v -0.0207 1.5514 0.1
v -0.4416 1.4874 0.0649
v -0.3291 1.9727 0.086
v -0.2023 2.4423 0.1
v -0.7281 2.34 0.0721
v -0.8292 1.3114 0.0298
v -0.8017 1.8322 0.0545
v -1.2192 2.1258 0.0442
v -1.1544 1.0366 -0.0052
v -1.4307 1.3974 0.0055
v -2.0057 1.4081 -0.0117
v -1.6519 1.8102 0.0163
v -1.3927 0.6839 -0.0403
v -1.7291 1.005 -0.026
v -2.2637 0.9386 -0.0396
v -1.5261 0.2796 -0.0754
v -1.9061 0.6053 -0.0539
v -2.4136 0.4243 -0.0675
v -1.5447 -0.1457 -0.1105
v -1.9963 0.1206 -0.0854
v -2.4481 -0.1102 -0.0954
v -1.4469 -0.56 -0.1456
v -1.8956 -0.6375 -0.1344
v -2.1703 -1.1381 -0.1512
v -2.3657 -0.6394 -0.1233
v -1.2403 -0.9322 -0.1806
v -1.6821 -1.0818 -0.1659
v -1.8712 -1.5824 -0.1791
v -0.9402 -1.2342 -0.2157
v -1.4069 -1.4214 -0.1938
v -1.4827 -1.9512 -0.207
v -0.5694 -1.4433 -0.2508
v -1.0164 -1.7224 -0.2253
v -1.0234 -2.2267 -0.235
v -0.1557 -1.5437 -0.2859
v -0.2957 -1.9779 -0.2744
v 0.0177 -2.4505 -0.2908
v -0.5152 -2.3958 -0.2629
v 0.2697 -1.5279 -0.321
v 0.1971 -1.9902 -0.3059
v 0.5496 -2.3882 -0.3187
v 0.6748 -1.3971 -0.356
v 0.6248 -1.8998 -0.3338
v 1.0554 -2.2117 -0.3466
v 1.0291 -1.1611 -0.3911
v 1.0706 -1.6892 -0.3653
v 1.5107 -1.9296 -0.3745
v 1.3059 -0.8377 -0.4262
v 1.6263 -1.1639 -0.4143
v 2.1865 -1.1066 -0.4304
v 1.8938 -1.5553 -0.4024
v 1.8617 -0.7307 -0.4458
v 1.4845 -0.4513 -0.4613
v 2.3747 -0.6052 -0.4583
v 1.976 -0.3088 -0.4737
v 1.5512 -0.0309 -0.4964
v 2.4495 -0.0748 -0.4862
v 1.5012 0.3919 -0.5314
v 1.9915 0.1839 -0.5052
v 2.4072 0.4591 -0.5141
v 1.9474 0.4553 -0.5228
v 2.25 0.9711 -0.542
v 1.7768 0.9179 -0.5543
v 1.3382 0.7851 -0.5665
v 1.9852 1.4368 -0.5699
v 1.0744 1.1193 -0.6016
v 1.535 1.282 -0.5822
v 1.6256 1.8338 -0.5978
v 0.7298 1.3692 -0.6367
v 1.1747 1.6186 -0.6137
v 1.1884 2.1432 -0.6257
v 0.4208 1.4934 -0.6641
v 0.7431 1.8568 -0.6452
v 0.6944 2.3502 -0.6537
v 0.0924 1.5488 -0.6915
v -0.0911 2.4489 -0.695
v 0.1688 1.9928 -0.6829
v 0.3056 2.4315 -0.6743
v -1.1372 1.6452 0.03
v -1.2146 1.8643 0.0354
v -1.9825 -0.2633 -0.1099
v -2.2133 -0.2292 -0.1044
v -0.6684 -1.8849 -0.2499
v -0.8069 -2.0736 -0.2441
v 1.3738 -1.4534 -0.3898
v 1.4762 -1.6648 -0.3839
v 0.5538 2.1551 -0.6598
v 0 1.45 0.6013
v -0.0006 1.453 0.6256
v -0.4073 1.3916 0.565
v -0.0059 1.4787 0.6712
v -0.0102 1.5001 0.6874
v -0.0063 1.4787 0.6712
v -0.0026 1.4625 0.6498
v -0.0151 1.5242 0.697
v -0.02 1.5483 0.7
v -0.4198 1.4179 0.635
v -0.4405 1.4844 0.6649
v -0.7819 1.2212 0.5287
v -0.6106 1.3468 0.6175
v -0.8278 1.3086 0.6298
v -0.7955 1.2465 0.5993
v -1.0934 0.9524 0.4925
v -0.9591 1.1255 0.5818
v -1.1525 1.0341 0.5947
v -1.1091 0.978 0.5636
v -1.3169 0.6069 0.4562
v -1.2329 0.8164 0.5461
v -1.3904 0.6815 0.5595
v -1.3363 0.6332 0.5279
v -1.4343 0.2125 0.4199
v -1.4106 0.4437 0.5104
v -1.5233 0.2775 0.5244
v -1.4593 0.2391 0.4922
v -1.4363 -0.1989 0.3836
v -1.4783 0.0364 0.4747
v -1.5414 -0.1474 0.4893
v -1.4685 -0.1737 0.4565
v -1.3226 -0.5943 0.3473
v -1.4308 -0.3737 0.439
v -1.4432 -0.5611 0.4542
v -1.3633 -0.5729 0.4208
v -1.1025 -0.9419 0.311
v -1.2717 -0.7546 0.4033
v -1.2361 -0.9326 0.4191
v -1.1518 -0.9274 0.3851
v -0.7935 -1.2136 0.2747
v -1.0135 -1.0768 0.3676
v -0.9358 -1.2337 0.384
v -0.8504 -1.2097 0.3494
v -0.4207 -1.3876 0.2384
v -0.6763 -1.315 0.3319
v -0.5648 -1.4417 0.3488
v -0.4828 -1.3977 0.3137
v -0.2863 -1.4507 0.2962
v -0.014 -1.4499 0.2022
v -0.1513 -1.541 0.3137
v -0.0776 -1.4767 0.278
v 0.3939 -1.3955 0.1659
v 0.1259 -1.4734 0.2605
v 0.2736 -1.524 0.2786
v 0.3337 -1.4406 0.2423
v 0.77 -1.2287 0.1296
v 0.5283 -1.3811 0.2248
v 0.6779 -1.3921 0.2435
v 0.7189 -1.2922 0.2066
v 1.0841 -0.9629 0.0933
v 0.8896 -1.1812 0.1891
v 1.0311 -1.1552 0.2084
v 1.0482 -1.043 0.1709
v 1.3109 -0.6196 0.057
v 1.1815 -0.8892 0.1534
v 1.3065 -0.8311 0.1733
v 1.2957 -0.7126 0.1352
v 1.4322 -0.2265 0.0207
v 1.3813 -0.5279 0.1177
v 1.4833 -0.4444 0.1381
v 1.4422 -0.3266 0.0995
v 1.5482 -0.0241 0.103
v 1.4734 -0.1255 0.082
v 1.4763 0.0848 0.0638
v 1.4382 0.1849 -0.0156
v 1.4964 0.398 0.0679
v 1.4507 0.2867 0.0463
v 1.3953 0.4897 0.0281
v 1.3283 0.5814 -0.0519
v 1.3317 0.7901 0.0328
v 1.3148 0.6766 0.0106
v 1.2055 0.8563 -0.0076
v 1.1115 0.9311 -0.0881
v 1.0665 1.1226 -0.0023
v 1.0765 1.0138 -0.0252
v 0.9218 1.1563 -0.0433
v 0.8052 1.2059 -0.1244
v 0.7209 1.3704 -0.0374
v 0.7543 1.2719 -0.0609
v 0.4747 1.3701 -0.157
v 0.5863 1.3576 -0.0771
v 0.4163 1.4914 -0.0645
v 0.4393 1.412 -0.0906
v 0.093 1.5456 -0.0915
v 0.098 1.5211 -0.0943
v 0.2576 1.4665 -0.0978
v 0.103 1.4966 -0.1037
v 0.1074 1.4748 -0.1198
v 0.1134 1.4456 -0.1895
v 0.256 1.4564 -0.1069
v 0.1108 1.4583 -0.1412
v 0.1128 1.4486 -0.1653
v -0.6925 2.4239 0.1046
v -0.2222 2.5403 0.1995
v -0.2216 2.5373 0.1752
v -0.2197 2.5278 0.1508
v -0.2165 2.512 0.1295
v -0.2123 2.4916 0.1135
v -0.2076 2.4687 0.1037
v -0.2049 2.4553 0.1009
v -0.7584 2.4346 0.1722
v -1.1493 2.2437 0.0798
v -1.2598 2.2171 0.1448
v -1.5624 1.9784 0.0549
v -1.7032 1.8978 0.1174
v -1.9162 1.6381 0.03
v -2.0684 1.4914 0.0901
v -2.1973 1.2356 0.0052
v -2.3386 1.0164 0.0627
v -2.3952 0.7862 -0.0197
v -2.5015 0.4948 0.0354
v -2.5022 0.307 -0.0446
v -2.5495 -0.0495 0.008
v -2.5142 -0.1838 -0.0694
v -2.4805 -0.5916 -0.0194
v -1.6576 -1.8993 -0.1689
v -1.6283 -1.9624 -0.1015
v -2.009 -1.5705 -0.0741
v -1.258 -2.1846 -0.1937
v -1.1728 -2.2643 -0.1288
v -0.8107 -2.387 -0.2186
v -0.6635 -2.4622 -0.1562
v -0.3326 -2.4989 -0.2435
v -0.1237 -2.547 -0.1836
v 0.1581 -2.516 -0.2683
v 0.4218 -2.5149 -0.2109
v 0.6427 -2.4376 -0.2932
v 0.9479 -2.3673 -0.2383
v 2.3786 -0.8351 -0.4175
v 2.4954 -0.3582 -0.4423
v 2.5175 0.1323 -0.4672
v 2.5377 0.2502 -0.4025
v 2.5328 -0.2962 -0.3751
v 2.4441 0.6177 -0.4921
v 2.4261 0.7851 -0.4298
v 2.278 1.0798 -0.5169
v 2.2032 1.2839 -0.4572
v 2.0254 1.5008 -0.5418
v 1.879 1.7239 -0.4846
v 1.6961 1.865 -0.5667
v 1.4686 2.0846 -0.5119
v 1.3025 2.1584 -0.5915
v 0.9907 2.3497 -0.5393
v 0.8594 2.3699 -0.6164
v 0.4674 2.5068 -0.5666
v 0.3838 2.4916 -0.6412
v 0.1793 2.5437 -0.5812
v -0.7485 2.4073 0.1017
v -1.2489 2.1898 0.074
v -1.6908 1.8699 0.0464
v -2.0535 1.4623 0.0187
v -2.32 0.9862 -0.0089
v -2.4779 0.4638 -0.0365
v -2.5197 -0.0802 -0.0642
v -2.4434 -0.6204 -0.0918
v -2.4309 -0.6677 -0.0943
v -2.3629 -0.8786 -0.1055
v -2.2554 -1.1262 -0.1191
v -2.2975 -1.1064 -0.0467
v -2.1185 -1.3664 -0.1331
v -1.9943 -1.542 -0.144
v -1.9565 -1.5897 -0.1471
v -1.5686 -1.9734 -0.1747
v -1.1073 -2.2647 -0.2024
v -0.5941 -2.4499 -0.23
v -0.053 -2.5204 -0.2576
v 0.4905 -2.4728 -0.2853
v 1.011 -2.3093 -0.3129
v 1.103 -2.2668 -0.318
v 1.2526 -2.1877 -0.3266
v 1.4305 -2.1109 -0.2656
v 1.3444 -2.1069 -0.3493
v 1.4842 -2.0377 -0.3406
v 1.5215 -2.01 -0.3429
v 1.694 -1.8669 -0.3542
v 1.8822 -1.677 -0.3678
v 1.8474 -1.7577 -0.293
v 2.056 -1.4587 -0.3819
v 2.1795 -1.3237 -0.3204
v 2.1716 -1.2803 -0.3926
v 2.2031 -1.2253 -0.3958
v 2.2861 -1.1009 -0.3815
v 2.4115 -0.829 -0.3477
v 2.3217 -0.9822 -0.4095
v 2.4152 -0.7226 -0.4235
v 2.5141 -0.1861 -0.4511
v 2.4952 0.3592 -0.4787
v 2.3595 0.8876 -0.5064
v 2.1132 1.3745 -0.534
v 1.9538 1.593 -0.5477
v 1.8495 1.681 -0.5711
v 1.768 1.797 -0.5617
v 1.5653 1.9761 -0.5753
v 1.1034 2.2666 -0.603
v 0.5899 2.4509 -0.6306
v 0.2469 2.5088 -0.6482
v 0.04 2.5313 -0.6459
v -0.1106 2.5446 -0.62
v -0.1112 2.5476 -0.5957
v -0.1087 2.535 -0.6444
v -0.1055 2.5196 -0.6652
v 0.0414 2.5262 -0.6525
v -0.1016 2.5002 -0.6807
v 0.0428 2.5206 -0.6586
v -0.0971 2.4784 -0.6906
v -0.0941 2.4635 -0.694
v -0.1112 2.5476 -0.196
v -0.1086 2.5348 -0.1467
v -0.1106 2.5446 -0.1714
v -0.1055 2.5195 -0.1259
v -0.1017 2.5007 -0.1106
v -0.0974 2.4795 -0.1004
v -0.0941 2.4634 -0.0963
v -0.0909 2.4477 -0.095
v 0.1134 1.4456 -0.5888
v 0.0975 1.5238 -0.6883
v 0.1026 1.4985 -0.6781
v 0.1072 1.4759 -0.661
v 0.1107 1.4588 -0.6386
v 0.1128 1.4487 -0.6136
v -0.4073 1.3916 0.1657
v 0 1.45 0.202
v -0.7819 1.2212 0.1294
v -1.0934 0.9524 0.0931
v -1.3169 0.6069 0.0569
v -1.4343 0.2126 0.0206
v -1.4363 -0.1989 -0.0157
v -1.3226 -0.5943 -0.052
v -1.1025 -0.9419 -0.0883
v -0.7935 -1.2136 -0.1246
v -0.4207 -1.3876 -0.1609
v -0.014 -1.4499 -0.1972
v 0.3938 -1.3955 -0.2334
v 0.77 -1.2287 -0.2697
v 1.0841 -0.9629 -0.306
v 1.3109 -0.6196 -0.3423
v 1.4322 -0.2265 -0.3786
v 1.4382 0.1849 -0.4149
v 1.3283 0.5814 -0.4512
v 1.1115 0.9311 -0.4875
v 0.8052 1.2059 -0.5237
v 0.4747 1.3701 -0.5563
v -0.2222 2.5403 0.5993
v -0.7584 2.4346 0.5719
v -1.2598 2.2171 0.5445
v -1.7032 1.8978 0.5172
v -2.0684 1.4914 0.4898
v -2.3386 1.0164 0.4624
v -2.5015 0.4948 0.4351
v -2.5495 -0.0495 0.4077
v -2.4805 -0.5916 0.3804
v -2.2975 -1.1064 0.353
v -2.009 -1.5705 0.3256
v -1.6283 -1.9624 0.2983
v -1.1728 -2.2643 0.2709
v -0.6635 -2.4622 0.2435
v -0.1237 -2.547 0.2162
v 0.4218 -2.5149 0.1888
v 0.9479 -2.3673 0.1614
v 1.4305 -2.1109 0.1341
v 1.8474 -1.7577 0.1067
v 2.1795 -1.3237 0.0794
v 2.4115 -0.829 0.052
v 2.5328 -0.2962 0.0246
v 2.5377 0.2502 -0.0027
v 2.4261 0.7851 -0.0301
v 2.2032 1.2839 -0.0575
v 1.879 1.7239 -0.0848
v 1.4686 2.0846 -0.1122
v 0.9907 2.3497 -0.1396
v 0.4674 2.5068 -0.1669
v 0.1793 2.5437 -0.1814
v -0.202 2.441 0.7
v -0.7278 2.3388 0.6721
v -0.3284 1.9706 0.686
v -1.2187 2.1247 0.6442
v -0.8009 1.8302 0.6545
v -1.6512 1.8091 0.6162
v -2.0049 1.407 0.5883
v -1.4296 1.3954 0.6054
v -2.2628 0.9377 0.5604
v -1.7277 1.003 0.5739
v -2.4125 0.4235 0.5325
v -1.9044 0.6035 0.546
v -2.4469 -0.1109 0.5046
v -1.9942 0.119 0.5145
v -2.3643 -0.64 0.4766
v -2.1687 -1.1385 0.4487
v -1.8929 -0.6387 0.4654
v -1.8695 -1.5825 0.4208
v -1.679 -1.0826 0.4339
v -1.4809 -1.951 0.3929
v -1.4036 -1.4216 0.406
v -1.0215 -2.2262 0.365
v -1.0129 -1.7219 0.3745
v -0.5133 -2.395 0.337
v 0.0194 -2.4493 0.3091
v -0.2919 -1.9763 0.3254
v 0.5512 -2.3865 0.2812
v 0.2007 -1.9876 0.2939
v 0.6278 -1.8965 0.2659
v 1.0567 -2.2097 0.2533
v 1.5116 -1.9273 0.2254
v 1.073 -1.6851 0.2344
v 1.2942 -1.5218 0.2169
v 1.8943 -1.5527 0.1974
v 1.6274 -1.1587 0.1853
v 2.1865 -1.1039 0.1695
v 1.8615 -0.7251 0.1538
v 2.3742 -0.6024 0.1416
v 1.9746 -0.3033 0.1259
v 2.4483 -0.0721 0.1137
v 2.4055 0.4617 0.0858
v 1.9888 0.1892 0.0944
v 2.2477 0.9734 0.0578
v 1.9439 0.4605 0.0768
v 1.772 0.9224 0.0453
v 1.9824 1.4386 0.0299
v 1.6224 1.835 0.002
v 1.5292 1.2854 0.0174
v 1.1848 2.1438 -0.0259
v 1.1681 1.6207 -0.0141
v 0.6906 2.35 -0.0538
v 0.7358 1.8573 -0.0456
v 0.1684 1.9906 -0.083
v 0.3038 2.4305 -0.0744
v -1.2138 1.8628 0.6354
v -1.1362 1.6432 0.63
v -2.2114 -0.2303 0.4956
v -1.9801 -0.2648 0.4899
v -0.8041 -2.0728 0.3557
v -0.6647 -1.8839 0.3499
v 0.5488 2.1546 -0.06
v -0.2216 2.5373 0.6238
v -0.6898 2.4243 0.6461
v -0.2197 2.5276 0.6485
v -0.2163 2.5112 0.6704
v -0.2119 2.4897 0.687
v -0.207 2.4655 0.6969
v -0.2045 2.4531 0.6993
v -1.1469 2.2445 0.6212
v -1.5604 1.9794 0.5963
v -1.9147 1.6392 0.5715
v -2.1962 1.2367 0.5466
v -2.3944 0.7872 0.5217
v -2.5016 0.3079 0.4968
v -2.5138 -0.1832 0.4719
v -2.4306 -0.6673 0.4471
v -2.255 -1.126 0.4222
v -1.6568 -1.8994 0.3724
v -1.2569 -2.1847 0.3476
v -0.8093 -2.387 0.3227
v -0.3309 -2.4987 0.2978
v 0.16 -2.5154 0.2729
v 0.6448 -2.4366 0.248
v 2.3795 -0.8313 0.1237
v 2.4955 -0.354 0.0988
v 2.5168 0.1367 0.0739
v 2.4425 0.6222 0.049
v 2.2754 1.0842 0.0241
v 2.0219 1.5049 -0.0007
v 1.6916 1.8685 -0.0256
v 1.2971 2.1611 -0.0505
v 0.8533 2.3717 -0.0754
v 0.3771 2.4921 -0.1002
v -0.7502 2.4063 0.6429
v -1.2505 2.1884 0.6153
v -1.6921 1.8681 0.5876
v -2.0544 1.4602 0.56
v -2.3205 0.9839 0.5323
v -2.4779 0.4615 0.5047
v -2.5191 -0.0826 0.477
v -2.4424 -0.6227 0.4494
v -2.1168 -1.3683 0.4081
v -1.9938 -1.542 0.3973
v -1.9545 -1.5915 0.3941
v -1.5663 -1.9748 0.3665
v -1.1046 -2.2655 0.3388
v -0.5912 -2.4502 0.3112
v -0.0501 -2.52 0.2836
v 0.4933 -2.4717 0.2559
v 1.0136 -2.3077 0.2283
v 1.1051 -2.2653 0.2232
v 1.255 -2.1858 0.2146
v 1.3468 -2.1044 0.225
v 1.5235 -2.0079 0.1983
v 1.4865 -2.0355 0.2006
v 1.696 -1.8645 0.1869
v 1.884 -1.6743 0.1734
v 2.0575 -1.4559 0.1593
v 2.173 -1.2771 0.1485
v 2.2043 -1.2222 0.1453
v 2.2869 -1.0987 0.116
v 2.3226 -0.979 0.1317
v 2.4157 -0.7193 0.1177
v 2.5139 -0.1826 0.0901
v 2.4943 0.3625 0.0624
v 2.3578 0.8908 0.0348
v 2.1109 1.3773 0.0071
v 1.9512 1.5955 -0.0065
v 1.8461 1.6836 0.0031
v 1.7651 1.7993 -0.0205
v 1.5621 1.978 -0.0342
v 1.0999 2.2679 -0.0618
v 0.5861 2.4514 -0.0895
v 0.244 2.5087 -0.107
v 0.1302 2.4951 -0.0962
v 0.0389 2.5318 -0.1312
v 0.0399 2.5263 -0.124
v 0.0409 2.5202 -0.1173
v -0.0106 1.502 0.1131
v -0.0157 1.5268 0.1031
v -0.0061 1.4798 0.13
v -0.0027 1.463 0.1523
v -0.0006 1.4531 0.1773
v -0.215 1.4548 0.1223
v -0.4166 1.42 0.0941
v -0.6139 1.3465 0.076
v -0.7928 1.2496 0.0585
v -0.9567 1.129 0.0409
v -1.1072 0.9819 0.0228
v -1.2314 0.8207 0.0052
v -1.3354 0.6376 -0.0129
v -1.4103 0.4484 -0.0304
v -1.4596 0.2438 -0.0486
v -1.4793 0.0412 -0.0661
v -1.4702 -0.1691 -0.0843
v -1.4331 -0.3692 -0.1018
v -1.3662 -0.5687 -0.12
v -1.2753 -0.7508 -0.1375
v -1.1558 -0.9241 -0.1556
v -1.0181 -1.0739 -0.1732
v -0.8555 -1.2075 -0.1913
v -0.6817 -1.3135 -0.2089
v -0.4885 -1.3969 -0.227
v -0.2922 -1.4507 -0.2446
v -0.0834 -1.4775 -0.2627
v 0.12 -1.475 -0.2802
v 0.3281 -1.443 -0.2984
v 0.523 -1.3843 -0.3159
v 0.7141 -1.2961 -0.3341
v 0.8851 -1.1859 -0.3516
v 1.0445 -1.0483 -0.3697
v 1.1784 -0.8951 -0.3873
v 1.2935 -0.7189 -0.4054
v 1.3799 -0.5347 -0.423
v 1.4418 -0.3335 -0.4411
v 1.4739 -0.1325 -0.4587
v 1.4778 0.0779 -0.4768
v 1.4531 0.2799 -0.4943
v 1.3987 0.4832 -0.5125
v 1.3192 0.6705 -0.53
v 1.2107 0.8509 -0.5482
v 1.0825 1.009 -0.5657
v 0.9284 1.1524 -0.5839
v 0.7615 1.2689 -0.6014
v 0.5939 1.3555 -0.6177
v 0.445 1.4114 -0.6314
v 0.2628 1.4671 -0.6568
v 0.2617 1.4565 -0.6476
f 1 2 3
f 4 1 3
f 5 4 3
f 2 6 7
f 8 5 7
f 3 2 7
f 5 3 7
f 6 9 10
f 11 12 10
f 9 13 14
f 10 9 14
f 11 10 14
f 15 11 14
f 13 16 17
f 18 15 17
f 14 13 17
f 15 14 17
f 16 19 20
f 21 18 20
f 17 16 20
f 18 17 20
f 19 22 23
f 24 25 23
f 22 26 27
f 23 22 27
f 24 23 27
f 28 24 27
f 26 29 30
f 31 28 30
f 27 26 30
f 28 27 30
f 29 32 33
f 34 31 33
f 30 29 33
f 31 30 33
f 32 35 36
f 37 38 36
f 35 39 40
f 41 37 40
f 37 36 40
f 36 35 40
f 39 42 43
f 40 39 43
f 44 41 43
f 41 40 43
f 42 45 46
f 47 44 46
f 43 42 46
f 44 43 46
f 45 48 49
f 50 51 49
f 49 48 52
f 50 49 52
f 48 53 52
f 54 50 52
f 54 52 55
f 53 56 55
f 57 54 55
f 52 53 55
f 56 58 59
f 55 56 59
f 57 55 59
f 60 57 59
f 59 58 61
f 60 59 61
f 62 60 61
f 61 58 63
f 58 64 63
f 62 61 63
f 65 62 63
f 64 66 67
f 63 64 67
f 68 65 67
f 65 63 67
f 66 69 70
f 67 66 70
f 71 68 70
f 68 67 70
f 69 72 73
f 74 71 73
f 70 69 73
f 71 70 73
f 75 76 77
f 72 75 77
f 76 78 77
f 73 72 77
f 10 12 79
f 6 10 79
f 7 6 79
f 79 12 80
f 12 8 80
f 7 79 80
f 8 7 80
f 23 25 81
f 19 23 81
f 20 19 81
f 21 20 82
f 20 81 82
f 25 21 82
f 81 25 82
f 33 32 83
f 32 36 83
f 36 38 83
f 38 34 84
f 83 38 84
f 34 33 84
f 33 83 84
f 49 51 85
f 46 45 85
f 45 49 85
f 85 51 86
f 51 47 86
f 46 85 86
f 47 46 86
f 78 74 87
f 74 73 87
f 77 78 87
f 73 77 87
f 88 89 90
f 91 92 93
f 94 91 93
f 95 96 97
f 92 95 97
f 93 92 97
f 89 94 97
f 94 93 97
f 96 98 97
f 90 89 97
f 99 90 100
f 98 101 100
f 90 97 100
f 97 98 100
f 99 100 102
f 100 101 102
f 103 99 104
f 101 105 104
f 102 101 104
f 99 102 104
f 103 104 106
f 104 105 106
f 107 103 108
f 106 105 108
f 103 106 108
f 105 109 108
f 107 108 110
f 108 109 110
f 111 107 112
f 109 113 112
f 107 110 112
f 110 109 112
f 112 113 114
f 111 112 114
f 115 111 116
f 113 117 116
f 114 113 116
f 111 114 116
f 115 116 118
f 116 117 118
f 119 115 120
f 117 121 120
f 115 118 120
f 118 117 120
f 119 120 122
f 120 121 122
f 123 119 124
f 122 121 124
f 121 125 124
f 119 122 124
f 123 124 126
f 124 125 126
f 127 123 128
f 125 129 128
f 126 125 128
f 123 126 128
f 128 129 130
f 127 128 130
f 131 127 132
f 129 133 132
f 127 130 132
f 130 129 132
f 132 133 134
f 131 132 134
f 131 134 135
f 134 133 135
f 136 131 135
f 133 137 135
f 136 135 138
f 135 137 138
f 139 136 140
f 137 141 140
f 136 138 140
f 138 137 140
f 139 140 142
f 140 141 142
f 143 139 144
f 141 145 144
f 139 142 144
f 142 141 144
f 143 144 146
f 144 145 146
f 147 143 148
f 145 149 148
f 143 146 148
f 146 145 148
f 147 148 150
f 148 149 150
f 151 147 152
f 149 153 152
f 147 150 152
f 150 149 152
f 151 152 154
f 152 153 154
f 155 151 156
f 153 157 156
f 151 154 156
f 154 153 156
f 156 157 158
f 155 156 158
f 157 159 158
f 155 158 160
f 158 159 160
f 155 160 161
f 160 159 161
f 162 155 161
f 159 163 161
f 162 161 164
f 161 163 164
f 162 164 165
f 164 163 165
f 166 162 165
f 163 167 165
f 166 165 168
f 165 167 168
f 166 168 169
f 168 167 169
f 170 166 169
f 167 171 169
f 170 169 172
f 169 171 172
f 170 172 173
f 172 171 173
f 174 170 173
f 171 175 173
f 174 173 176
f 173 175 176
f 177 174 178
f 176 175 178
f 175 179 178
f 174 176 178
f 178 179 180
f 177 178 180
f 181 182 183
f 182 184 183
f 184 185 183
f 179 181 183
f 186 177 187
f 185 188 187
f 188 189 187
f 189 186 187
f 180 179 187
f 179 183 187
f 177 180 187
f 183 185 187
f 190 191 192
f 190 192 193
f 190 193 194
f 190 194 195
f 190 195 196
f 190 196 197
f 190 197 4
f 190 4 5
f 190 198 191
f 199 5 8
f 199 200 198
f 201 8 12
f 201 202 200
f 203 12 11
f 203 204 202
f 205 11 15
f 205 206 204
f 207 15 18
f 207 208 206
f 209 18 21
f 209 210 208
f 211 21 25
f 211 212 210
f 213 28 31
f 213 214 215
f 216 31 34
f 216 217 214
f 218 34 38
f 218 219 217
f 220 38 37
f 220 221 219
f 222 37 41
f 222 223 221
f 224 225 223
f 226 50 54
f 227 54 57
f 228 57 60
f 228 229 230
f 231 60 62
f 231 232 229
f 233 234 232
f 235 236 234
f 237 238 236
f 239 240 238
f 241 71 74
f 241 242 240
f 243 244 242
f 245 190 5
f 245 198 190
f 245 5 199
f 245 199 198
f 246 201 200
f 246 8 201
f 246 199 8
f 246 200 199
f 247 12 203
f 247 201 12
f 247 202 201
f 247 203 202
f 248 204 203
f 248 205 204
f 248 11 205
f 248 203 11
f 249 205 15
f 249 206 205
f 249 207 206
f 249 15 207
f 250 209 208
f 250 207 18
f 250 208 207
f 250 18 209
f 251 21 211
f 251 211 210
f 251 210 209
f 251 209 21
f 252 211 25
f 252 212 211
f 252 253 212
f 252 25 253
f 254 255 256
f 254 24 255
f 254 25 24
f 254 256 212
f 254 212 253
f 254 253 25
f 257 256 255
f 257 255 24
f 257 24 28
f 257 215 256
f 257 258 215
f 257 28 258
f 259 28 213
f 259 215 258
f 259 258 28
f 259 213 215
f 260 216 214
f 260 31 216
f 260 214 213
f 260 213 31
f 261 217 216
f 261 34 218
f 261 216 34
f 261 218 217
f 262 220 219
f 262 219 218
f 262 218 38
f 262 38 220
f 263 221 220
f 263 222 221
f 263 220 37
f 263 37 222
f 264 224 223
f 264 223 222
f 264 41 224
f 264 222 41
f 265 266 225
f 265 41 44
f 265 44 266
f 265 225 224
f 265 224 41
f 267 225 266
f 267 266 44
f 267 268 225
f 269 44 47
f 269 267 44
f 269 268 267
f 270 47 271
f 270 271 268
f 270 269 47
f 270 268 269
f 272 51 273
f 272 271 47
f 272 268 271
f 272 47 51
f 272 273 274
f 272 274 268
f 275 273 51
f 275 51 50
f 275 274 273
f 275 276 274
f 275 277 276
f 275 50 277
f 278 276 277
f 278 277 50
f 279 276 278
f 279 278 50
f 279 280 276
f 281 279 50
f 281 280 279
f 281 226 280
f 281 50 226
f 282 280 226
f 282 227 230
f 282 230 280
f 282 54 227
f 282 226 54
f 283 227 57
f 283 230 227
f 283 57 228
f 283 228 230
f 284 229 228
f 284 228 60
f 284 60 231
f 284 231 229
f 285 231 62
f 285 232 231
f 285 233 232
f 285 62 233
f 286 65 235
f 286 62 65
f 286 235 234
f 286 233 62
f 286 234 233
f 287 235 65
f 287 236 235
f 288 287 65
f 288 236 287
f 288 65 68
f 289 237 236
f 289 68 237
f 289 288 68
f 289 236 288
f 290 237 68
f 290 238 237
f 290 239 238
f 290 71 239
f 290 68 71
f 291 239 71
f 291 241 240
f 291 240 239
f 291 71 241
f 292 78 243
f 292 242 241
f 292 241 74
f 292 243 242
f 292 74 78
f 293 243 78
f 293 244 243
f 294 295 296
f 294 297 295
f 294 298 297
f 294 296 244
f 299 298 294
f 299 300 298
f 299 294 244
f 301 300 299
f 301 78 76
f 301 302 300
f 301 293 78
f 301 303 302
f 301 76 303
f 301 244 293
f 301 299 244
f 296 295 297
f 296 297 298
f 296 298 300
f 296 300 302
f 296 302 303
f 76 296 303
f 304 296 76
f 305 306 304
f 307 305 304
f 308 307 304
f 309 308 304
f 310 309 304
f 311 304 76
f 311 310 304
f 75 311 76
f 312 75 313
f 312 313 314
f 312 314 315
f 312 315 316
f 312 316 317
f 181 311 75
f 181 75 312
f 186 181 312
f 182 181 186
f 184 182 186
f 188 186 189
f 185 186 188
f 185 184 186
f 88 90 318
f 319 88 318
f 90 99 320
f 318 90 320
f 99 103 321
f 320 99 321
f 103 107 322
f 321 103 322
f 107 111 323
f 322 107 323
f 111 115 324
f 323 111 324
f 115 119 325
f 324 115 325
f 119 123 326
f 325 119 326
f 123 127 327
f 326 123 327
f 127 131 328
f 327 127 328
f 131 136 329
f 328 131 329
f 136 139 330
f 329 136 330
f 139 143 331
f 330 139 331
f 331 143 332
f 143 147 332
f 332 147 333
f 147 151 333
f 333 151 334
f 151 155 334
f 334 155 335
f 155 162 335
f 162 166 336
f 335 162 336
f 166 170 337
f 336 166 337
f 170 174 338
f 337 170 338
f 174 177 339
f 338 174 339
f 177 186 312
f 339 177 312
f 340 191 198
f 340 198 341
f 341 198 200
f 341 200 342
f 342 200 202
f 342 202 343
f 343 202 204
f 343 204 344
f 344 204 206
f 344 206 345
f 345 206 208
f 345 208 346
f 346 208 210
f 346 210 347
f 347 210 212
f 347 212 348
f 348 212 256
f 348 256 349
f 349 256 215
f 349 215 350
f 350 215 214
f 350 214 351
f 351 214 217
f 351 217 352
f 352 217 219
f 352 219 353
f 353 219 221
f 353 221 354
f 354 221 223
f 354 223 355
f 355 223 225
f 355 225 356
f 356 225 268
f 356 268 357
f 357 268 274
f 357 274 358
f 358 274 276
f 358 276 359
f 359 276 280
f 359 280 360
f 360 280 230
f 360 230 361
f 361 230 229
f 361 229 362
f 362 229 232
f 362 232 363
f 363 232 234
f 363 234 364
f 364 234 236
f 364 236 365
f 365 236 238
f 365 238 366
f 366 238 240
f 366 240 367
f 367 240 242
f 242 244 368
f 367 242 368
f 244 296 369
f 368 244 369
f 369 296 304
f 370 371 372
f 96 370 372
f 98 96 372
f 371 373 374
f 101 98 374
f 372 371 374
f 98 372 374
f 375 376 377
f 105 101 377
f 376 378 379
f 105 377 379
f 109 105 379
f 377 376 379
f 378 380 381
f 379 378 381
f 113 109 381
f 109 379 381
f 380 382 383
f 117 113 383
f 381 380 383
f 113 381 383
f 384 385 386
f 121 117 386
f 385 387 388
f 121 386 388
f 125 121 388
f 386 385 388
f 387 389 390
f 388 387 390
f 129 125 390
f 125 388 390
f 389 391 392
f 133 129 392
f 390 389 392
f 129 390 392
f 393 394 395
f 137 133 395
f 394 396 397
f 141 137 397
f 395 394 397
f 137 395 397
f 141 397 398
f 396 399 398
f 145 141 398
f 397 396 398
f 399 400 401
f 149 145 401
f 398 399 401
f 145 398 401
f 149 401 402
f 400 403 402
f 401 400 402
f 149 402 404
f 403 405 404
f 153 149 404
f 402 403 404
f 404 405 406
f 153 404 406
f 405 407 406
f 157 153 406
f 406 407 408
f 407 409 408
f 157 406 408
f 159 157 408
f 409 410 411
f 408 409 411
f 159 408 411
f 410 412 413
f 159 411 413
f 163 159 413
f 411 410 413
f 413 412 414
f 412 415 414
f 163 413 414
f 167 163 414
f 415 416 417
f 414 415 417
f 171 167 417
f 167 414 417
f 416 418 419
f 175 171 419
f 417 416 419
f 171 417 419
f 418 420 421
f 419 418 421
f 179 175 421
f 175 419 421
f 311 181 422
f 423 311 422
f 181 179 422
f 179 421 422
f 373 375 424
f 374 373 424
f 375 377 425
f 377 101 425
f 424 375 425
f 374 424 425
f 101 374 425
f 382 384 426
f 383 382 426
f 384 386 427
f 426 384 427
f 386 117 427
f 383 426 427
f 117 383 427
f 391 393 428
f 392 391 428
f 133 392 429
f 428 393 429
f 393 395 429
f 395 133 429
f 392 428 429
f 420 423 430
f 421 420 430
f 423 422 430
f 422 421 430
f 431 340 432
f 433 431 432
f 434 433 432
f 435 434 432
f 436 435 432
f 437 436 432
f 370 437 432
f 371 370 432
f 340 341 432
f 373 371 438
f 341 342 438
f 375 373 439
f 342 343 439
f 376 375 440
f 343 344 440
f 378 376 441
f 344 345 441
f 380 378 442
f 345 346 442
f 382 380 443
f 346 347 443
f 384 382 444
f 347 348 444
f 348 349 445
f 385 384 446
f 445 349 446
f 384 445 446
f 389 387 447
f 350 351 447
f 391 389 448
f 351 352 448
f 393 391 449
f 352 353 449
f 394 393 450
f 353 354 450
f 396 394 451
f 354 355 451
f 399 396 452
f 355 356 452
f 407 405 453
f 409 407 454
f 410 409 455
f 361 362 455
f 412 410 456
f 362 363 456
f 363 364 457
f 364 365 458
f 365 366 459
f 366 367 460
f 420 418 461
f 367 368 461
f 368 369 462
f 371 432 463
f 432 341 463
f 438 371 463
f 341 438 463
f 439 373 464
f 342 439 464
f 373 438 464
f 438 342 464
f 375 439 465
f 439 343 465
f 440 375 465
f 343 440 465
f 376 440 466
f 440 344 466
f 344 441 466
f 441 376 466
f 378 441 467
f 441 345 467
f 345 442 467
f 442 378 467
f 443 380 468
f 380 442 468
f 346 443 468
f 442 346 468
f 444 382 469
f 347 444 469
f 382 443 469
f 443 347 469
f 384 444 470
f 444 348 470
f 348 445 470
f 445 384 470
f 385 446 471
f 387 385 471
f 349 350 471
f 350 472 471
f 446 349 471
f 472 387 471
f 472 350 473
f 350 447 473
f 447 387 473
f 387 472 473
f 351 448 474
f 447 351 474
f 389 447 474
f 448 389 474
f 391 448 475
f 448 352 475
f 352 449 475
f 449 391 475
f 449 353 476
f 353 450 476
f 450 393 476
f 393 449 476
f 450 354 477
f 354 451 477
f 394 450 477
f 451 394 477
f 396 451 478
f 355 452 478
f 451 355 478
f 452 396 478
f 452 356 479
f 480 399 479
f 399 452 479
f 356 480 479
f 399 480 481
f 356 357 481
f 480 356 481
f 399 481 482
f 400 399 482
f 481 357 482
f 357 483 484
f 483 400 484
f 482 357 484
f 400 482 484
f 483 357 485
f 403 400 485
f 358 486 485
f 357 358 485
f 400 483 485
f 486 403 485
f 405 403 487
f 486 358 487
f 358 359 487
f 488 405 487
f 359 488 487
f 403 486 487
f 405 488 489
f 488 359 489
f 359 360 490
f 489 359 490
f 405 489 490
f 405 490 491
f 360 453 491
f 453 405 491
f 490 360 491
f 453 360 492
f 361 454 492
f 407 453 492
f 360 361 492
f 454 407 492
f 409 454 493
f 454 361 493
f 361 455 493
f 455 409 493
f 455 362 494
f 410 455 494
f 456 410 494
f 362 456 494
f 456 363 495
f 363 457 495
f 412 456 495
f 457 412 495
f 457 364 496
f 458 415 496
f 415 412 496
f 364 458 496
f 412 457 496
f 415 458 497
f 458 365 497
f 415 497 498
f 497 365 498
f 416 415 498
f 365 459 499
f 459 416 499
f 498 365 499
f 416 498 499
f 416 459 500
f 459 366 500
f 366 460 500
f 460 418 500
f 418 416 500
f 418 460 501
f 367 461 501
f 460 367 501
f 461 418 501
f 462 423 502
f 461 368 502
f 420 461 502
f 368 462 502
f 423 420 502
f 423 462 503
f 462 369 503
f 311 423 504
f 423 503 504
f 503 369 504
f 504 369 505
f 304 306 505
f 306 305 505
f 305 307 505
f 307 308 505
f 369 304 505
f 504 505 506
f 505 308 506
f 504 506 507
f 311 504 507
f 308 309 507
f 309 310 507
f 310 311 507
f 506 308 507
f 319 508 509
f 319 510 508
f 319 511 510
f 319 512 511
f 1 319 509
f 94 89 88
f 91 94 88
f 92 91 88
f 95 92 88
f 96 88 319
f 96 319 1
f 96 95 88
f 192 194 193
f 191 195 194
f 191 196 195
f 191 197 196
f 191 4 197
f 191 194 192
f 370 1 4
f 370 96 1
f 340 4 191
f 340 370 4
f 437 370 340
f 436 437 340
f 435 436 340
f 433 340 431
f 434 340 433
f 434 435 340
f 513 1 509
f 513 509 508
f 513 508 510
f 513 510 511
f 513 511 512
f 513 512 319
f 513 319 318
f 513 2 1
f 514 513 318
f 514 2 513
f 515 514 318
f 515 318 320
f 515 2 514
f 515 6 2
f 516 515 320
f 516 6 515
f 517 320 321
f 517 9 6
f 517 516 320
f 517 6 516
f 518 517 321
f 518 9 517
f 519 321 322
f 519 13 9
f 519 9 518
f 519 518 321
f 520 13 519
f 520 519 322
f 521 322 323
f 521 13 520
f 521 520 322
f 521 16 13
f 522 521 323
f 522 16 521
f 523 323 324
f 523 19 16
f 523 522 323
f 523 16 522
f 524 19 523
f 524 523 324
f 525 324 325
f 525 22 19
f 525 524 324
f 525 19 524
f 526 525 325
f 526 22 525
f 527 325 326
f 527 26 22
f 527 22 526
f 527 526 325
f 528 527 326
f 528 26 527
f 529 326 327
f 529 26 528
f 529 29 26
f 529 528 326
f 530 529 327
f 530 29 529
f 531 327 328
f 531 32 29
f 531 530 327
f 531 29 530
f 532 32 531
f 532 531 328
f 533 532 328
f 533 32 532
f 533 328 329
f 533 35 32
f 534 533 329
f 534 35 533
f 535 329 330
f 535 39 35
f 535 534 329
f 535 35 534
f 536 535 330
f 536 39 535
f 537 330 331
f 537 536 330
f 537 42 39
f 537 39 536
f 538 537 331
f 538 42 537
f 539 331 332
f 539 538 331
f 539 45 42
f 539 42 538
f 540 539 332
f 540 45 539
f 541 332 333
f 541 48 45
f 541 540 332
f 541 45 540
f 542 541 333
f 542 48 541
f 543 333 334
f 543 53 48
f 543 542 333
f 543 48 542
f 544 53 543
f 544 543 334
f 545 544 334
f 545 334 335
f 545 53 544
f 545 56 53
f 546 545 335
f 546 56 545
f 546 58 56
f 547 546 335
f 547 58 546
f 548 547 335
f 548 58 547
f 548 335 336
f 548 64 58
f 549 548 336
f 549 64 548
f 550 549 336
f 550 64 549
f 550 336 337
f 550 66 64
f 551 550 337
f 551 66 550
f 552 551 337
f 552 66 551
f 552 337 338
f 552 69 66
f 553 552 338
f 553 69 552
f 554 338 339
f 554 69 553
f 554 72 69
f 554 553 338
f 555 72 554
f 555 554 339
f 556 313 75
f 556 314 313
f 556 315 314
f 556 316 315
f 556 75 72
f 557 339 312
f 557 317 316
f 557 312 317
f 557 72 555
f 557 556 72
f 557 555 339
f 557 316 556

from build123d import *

# Parameters (mm, degrees)
SWEEP1_PITCH       = 0.800801
SWEEP1_HEIGHT      = 0.8
SWEEP1_RADIUS      = 2.55
SWEEP1_START_ANGLE = 85
CUT_EXTRUDE1_DEPTH = 1.7
FILLET1_R          = 0.1


with BuildPart() as part:
    # Sweep1: sweep along a helix
    with BuildLine() as sweep1_path:
        add(Helix(SWEEP1_PITCH, SWEEP1_HEIGHT, SWEEP1_RADIUS, center=(0, 0, 0.4), direction=(0, 0, -1), lefthand=True, mode=Mode.PRIVATE).rotate(Axis((0, 0, 0.4), (0, 0, -1)), SWEEP1_START_ANGLE))
    # Sketch4 → Sweep1 (sweep)
    with BuildSketch(Plane(origin=(0.312685, -0.083965, 0.005065), x_dir=(0.006985, -0.034268, -0.999388), z_dir=(0.97985, 0.199734, 0))):
        Polygon((-0.788176, 2.652285), (-0.188543, 2.673268), (-0.149628, 1.561232), (-0.749261, 1.540248), align=None)
    sweep(path=sweep1_path.line, is_frenet=True)

    # Sketch5 → Cut-Extrude1 (cut, through all)
    with BuildSketch(Plane.XY):
        with BuildLine():
            Line((0, 1.45), (-0.222247, 2.540296))
            ThreePointArc((-0.222247, 2.540296), (-0.166778, 2.54454), (-0.111229, 2.547573))
            Line((-0.111229, 2.547573), (0.113406, 1.445558))
            ThreePointArc((0.113406, 1.445558), (0.056747, 1.448889), (0, 1.45))
        make_face()
    extrude(amount=-CUT_EXTRUDE1_DEPTH, mode=Mode.SUBTRACT)

    # Fillet1
    fillet1_edges = [part.edges().sort_by_distance(p)[0] for p in [
        (0.166778, -2.544538, 0.30238),
        (0.166778, -2.544538, -0.29762),
        (-0.056747, -1.448888, 0.304589),
        (-0.056747, -1.448888, -0.295411),
    ]]
    fillet(fillet1_edges, radius=FILLET1_R)


solid = part.part
